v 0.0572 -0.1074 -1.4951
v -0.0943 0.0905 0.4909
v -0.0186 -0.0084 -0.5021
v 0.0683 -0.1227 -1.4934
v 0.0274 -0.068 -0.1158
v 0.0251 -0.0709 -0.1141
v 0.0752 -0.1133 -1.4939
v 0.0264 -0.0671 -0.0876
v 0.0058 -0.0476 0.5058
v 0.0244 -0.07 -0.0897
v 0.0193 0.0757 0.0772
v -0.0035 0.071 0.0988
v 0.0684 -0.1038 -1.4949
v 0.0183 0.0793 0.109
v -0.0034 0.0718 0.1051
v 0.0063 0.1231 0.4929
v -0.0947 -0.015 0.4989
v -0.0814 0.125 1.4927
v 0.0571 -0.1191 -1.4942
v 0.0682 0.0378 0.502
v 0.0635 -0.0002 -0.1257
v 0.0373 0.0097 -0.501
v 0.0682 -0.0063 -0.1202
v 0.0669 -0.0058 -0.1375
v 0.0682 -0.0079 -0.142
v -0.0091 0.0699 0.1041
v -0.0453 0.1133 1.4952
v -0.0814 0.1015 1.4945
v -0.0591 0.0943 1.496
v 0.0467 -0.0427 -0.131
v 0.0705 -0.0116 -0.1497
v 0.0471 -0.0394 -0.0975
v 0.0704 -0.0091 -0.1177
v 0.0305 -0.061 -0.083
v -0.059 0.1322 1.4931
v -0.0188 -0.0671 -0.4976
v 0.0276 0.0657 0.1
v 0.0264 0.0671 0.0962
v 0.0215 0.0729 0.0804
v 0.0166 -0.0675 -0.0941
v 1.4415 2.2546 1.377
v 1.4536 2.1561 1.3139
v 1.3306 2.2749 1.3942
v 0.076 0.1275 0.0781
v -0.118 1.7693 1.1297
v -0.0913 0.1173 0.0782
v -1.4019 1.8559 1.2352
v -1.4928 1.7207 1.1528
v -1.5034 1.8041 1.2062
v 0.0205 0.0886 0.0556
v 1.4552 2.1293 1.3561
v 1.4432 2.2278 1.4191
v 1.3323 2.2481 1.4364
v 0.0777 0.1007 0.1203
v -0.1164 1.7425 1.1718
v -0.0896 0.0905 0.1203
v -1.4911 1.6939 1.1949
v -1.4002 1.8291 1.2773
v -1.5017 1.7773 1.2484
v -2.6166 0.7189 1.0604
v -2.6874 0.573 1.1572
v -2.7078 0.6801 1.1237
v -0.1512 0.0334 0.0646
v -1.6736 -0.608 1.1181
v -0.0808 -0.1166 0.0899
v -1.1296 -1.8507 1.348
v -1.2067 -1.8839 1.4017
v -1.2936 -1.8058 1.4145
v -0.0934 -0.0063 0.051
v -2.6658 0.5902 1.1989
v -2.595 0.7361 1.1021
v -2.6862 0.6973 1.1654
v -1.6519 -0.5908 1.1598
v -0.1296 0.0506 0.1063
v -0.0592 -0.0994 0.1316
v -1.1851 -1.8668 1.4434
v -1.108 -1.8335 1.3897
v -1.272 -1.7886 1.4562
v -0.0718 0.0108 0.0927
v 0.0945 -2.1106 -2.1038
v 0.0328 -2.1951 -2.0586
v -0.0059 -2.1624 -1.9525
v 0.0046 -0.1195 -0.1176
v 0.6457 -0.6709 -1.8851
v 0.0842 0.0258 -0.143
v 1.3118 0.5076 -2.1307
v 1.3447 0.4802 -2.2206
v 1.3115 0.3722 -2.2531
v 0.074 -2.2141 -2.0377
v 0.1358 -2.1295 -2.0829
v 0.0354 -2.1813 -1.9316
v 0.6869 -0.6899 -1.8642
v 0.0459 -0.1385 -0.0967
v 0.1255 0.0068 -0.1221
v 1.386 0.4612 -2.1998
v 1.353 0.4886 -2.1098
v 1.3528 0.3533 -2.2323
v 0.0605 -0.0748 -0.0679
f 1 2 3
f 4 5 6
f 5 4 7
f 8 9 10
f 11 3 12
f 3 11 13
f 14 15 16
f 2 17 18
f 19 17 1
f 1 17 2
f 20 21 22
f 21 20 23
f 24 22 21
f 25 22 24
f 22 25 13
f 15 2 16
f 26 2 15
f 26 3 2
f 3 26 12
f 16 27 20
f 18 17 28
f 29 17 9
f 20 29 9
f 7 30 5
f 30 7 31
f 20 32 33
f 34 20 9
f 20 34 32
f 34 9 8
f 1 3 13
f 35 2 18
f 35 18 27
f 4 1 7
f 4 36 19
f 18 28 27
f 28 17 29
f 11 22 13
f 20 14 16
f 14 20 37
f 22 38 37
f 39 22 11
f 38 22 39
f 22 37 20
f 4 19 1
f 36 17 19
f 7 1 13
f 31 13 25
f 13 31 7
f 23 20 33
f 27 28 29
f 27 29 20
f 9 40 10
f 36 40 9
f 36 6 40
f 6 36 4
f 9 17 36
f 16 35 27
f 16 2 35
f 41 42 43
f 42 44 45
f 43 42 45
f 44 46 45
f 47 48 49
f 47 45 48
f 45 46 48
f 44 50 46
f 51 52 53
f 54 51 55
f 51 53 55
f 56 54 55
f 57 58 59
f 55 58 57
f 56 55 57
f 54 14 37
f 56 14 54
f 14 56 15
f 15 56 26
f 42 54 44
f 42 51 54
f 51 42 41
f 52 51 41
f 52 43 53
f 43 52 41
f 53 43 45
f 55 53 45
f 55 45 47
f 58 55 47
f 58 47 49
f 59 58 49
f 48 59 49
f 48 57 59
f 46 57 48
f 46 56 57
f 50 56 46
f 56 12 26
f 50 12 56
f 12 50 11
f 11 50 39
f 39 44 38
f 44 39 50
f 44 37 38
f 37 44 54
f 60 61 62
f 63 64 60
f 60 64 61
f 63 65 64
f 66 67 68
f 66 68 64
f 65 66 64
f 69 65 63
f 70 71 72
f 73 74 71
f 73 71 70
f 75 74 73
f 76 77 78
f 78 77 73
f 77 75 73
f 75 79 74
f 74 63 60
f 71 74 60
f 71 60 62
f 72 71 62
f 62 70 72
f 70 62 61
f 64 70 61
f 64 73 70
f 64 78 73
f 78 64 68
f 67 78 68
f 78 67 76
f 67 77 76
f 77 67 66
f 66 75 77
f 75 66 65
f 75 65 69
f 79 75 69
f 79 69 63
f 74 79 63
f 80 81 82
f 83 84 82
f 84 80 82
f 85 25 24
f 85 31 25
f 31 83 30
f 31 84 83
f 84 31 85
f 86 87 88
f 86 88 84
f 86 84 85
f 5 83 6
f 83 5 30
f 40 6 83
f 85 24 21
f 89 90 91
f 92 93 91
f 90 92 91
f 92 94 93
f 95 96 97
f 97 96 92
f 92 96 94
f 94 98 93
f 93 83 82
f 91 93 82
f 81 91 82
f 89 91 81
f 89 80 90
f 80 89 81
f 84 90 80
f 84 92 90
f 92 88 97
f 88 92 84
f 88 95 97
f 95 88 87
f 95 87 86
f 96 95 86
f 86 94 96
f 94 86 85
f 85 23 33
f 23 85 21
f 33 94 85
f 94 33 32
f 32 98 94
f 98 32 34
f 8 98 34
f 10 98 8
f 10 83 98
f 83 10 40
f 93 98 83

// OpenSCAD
$t2=$t+1/3;
$t3=$t+2/3;
rotate([sin($t3*360)*5,cos($t3*360)*5,0])hull(){
cylinder(3,0.01,0.02,center= true);
cylinder(1,0.05,0.09,center= true);
}
rotate([sin($t*360+30)*65,sin($t*360)*10,cos(45+$t*360)*5])linear_extrude(.05)offset(.1)polygon([[0,0.2],[1.5,2.5],[0,2],[-1.3,2.2]]);
rotate(120)rotate([sin($t2*360+30)*65,sin($t2*360)*10,cos(45+$t2*360)*5])linear_extrude(.05)offset(.1)polygon([[0,0.2],[1.5,2.5],[0,2],[-1.3,2.2]]);
rotate(240)rotate([sin($t3*360+30)*65,sin($t3*360)*10,cos(45+$t3*360)*5])linear_extrude(.05)offset(.1)polygon([[0,0.2],[1.5,2.5],[0,2],[-1.3,2.2]]);
